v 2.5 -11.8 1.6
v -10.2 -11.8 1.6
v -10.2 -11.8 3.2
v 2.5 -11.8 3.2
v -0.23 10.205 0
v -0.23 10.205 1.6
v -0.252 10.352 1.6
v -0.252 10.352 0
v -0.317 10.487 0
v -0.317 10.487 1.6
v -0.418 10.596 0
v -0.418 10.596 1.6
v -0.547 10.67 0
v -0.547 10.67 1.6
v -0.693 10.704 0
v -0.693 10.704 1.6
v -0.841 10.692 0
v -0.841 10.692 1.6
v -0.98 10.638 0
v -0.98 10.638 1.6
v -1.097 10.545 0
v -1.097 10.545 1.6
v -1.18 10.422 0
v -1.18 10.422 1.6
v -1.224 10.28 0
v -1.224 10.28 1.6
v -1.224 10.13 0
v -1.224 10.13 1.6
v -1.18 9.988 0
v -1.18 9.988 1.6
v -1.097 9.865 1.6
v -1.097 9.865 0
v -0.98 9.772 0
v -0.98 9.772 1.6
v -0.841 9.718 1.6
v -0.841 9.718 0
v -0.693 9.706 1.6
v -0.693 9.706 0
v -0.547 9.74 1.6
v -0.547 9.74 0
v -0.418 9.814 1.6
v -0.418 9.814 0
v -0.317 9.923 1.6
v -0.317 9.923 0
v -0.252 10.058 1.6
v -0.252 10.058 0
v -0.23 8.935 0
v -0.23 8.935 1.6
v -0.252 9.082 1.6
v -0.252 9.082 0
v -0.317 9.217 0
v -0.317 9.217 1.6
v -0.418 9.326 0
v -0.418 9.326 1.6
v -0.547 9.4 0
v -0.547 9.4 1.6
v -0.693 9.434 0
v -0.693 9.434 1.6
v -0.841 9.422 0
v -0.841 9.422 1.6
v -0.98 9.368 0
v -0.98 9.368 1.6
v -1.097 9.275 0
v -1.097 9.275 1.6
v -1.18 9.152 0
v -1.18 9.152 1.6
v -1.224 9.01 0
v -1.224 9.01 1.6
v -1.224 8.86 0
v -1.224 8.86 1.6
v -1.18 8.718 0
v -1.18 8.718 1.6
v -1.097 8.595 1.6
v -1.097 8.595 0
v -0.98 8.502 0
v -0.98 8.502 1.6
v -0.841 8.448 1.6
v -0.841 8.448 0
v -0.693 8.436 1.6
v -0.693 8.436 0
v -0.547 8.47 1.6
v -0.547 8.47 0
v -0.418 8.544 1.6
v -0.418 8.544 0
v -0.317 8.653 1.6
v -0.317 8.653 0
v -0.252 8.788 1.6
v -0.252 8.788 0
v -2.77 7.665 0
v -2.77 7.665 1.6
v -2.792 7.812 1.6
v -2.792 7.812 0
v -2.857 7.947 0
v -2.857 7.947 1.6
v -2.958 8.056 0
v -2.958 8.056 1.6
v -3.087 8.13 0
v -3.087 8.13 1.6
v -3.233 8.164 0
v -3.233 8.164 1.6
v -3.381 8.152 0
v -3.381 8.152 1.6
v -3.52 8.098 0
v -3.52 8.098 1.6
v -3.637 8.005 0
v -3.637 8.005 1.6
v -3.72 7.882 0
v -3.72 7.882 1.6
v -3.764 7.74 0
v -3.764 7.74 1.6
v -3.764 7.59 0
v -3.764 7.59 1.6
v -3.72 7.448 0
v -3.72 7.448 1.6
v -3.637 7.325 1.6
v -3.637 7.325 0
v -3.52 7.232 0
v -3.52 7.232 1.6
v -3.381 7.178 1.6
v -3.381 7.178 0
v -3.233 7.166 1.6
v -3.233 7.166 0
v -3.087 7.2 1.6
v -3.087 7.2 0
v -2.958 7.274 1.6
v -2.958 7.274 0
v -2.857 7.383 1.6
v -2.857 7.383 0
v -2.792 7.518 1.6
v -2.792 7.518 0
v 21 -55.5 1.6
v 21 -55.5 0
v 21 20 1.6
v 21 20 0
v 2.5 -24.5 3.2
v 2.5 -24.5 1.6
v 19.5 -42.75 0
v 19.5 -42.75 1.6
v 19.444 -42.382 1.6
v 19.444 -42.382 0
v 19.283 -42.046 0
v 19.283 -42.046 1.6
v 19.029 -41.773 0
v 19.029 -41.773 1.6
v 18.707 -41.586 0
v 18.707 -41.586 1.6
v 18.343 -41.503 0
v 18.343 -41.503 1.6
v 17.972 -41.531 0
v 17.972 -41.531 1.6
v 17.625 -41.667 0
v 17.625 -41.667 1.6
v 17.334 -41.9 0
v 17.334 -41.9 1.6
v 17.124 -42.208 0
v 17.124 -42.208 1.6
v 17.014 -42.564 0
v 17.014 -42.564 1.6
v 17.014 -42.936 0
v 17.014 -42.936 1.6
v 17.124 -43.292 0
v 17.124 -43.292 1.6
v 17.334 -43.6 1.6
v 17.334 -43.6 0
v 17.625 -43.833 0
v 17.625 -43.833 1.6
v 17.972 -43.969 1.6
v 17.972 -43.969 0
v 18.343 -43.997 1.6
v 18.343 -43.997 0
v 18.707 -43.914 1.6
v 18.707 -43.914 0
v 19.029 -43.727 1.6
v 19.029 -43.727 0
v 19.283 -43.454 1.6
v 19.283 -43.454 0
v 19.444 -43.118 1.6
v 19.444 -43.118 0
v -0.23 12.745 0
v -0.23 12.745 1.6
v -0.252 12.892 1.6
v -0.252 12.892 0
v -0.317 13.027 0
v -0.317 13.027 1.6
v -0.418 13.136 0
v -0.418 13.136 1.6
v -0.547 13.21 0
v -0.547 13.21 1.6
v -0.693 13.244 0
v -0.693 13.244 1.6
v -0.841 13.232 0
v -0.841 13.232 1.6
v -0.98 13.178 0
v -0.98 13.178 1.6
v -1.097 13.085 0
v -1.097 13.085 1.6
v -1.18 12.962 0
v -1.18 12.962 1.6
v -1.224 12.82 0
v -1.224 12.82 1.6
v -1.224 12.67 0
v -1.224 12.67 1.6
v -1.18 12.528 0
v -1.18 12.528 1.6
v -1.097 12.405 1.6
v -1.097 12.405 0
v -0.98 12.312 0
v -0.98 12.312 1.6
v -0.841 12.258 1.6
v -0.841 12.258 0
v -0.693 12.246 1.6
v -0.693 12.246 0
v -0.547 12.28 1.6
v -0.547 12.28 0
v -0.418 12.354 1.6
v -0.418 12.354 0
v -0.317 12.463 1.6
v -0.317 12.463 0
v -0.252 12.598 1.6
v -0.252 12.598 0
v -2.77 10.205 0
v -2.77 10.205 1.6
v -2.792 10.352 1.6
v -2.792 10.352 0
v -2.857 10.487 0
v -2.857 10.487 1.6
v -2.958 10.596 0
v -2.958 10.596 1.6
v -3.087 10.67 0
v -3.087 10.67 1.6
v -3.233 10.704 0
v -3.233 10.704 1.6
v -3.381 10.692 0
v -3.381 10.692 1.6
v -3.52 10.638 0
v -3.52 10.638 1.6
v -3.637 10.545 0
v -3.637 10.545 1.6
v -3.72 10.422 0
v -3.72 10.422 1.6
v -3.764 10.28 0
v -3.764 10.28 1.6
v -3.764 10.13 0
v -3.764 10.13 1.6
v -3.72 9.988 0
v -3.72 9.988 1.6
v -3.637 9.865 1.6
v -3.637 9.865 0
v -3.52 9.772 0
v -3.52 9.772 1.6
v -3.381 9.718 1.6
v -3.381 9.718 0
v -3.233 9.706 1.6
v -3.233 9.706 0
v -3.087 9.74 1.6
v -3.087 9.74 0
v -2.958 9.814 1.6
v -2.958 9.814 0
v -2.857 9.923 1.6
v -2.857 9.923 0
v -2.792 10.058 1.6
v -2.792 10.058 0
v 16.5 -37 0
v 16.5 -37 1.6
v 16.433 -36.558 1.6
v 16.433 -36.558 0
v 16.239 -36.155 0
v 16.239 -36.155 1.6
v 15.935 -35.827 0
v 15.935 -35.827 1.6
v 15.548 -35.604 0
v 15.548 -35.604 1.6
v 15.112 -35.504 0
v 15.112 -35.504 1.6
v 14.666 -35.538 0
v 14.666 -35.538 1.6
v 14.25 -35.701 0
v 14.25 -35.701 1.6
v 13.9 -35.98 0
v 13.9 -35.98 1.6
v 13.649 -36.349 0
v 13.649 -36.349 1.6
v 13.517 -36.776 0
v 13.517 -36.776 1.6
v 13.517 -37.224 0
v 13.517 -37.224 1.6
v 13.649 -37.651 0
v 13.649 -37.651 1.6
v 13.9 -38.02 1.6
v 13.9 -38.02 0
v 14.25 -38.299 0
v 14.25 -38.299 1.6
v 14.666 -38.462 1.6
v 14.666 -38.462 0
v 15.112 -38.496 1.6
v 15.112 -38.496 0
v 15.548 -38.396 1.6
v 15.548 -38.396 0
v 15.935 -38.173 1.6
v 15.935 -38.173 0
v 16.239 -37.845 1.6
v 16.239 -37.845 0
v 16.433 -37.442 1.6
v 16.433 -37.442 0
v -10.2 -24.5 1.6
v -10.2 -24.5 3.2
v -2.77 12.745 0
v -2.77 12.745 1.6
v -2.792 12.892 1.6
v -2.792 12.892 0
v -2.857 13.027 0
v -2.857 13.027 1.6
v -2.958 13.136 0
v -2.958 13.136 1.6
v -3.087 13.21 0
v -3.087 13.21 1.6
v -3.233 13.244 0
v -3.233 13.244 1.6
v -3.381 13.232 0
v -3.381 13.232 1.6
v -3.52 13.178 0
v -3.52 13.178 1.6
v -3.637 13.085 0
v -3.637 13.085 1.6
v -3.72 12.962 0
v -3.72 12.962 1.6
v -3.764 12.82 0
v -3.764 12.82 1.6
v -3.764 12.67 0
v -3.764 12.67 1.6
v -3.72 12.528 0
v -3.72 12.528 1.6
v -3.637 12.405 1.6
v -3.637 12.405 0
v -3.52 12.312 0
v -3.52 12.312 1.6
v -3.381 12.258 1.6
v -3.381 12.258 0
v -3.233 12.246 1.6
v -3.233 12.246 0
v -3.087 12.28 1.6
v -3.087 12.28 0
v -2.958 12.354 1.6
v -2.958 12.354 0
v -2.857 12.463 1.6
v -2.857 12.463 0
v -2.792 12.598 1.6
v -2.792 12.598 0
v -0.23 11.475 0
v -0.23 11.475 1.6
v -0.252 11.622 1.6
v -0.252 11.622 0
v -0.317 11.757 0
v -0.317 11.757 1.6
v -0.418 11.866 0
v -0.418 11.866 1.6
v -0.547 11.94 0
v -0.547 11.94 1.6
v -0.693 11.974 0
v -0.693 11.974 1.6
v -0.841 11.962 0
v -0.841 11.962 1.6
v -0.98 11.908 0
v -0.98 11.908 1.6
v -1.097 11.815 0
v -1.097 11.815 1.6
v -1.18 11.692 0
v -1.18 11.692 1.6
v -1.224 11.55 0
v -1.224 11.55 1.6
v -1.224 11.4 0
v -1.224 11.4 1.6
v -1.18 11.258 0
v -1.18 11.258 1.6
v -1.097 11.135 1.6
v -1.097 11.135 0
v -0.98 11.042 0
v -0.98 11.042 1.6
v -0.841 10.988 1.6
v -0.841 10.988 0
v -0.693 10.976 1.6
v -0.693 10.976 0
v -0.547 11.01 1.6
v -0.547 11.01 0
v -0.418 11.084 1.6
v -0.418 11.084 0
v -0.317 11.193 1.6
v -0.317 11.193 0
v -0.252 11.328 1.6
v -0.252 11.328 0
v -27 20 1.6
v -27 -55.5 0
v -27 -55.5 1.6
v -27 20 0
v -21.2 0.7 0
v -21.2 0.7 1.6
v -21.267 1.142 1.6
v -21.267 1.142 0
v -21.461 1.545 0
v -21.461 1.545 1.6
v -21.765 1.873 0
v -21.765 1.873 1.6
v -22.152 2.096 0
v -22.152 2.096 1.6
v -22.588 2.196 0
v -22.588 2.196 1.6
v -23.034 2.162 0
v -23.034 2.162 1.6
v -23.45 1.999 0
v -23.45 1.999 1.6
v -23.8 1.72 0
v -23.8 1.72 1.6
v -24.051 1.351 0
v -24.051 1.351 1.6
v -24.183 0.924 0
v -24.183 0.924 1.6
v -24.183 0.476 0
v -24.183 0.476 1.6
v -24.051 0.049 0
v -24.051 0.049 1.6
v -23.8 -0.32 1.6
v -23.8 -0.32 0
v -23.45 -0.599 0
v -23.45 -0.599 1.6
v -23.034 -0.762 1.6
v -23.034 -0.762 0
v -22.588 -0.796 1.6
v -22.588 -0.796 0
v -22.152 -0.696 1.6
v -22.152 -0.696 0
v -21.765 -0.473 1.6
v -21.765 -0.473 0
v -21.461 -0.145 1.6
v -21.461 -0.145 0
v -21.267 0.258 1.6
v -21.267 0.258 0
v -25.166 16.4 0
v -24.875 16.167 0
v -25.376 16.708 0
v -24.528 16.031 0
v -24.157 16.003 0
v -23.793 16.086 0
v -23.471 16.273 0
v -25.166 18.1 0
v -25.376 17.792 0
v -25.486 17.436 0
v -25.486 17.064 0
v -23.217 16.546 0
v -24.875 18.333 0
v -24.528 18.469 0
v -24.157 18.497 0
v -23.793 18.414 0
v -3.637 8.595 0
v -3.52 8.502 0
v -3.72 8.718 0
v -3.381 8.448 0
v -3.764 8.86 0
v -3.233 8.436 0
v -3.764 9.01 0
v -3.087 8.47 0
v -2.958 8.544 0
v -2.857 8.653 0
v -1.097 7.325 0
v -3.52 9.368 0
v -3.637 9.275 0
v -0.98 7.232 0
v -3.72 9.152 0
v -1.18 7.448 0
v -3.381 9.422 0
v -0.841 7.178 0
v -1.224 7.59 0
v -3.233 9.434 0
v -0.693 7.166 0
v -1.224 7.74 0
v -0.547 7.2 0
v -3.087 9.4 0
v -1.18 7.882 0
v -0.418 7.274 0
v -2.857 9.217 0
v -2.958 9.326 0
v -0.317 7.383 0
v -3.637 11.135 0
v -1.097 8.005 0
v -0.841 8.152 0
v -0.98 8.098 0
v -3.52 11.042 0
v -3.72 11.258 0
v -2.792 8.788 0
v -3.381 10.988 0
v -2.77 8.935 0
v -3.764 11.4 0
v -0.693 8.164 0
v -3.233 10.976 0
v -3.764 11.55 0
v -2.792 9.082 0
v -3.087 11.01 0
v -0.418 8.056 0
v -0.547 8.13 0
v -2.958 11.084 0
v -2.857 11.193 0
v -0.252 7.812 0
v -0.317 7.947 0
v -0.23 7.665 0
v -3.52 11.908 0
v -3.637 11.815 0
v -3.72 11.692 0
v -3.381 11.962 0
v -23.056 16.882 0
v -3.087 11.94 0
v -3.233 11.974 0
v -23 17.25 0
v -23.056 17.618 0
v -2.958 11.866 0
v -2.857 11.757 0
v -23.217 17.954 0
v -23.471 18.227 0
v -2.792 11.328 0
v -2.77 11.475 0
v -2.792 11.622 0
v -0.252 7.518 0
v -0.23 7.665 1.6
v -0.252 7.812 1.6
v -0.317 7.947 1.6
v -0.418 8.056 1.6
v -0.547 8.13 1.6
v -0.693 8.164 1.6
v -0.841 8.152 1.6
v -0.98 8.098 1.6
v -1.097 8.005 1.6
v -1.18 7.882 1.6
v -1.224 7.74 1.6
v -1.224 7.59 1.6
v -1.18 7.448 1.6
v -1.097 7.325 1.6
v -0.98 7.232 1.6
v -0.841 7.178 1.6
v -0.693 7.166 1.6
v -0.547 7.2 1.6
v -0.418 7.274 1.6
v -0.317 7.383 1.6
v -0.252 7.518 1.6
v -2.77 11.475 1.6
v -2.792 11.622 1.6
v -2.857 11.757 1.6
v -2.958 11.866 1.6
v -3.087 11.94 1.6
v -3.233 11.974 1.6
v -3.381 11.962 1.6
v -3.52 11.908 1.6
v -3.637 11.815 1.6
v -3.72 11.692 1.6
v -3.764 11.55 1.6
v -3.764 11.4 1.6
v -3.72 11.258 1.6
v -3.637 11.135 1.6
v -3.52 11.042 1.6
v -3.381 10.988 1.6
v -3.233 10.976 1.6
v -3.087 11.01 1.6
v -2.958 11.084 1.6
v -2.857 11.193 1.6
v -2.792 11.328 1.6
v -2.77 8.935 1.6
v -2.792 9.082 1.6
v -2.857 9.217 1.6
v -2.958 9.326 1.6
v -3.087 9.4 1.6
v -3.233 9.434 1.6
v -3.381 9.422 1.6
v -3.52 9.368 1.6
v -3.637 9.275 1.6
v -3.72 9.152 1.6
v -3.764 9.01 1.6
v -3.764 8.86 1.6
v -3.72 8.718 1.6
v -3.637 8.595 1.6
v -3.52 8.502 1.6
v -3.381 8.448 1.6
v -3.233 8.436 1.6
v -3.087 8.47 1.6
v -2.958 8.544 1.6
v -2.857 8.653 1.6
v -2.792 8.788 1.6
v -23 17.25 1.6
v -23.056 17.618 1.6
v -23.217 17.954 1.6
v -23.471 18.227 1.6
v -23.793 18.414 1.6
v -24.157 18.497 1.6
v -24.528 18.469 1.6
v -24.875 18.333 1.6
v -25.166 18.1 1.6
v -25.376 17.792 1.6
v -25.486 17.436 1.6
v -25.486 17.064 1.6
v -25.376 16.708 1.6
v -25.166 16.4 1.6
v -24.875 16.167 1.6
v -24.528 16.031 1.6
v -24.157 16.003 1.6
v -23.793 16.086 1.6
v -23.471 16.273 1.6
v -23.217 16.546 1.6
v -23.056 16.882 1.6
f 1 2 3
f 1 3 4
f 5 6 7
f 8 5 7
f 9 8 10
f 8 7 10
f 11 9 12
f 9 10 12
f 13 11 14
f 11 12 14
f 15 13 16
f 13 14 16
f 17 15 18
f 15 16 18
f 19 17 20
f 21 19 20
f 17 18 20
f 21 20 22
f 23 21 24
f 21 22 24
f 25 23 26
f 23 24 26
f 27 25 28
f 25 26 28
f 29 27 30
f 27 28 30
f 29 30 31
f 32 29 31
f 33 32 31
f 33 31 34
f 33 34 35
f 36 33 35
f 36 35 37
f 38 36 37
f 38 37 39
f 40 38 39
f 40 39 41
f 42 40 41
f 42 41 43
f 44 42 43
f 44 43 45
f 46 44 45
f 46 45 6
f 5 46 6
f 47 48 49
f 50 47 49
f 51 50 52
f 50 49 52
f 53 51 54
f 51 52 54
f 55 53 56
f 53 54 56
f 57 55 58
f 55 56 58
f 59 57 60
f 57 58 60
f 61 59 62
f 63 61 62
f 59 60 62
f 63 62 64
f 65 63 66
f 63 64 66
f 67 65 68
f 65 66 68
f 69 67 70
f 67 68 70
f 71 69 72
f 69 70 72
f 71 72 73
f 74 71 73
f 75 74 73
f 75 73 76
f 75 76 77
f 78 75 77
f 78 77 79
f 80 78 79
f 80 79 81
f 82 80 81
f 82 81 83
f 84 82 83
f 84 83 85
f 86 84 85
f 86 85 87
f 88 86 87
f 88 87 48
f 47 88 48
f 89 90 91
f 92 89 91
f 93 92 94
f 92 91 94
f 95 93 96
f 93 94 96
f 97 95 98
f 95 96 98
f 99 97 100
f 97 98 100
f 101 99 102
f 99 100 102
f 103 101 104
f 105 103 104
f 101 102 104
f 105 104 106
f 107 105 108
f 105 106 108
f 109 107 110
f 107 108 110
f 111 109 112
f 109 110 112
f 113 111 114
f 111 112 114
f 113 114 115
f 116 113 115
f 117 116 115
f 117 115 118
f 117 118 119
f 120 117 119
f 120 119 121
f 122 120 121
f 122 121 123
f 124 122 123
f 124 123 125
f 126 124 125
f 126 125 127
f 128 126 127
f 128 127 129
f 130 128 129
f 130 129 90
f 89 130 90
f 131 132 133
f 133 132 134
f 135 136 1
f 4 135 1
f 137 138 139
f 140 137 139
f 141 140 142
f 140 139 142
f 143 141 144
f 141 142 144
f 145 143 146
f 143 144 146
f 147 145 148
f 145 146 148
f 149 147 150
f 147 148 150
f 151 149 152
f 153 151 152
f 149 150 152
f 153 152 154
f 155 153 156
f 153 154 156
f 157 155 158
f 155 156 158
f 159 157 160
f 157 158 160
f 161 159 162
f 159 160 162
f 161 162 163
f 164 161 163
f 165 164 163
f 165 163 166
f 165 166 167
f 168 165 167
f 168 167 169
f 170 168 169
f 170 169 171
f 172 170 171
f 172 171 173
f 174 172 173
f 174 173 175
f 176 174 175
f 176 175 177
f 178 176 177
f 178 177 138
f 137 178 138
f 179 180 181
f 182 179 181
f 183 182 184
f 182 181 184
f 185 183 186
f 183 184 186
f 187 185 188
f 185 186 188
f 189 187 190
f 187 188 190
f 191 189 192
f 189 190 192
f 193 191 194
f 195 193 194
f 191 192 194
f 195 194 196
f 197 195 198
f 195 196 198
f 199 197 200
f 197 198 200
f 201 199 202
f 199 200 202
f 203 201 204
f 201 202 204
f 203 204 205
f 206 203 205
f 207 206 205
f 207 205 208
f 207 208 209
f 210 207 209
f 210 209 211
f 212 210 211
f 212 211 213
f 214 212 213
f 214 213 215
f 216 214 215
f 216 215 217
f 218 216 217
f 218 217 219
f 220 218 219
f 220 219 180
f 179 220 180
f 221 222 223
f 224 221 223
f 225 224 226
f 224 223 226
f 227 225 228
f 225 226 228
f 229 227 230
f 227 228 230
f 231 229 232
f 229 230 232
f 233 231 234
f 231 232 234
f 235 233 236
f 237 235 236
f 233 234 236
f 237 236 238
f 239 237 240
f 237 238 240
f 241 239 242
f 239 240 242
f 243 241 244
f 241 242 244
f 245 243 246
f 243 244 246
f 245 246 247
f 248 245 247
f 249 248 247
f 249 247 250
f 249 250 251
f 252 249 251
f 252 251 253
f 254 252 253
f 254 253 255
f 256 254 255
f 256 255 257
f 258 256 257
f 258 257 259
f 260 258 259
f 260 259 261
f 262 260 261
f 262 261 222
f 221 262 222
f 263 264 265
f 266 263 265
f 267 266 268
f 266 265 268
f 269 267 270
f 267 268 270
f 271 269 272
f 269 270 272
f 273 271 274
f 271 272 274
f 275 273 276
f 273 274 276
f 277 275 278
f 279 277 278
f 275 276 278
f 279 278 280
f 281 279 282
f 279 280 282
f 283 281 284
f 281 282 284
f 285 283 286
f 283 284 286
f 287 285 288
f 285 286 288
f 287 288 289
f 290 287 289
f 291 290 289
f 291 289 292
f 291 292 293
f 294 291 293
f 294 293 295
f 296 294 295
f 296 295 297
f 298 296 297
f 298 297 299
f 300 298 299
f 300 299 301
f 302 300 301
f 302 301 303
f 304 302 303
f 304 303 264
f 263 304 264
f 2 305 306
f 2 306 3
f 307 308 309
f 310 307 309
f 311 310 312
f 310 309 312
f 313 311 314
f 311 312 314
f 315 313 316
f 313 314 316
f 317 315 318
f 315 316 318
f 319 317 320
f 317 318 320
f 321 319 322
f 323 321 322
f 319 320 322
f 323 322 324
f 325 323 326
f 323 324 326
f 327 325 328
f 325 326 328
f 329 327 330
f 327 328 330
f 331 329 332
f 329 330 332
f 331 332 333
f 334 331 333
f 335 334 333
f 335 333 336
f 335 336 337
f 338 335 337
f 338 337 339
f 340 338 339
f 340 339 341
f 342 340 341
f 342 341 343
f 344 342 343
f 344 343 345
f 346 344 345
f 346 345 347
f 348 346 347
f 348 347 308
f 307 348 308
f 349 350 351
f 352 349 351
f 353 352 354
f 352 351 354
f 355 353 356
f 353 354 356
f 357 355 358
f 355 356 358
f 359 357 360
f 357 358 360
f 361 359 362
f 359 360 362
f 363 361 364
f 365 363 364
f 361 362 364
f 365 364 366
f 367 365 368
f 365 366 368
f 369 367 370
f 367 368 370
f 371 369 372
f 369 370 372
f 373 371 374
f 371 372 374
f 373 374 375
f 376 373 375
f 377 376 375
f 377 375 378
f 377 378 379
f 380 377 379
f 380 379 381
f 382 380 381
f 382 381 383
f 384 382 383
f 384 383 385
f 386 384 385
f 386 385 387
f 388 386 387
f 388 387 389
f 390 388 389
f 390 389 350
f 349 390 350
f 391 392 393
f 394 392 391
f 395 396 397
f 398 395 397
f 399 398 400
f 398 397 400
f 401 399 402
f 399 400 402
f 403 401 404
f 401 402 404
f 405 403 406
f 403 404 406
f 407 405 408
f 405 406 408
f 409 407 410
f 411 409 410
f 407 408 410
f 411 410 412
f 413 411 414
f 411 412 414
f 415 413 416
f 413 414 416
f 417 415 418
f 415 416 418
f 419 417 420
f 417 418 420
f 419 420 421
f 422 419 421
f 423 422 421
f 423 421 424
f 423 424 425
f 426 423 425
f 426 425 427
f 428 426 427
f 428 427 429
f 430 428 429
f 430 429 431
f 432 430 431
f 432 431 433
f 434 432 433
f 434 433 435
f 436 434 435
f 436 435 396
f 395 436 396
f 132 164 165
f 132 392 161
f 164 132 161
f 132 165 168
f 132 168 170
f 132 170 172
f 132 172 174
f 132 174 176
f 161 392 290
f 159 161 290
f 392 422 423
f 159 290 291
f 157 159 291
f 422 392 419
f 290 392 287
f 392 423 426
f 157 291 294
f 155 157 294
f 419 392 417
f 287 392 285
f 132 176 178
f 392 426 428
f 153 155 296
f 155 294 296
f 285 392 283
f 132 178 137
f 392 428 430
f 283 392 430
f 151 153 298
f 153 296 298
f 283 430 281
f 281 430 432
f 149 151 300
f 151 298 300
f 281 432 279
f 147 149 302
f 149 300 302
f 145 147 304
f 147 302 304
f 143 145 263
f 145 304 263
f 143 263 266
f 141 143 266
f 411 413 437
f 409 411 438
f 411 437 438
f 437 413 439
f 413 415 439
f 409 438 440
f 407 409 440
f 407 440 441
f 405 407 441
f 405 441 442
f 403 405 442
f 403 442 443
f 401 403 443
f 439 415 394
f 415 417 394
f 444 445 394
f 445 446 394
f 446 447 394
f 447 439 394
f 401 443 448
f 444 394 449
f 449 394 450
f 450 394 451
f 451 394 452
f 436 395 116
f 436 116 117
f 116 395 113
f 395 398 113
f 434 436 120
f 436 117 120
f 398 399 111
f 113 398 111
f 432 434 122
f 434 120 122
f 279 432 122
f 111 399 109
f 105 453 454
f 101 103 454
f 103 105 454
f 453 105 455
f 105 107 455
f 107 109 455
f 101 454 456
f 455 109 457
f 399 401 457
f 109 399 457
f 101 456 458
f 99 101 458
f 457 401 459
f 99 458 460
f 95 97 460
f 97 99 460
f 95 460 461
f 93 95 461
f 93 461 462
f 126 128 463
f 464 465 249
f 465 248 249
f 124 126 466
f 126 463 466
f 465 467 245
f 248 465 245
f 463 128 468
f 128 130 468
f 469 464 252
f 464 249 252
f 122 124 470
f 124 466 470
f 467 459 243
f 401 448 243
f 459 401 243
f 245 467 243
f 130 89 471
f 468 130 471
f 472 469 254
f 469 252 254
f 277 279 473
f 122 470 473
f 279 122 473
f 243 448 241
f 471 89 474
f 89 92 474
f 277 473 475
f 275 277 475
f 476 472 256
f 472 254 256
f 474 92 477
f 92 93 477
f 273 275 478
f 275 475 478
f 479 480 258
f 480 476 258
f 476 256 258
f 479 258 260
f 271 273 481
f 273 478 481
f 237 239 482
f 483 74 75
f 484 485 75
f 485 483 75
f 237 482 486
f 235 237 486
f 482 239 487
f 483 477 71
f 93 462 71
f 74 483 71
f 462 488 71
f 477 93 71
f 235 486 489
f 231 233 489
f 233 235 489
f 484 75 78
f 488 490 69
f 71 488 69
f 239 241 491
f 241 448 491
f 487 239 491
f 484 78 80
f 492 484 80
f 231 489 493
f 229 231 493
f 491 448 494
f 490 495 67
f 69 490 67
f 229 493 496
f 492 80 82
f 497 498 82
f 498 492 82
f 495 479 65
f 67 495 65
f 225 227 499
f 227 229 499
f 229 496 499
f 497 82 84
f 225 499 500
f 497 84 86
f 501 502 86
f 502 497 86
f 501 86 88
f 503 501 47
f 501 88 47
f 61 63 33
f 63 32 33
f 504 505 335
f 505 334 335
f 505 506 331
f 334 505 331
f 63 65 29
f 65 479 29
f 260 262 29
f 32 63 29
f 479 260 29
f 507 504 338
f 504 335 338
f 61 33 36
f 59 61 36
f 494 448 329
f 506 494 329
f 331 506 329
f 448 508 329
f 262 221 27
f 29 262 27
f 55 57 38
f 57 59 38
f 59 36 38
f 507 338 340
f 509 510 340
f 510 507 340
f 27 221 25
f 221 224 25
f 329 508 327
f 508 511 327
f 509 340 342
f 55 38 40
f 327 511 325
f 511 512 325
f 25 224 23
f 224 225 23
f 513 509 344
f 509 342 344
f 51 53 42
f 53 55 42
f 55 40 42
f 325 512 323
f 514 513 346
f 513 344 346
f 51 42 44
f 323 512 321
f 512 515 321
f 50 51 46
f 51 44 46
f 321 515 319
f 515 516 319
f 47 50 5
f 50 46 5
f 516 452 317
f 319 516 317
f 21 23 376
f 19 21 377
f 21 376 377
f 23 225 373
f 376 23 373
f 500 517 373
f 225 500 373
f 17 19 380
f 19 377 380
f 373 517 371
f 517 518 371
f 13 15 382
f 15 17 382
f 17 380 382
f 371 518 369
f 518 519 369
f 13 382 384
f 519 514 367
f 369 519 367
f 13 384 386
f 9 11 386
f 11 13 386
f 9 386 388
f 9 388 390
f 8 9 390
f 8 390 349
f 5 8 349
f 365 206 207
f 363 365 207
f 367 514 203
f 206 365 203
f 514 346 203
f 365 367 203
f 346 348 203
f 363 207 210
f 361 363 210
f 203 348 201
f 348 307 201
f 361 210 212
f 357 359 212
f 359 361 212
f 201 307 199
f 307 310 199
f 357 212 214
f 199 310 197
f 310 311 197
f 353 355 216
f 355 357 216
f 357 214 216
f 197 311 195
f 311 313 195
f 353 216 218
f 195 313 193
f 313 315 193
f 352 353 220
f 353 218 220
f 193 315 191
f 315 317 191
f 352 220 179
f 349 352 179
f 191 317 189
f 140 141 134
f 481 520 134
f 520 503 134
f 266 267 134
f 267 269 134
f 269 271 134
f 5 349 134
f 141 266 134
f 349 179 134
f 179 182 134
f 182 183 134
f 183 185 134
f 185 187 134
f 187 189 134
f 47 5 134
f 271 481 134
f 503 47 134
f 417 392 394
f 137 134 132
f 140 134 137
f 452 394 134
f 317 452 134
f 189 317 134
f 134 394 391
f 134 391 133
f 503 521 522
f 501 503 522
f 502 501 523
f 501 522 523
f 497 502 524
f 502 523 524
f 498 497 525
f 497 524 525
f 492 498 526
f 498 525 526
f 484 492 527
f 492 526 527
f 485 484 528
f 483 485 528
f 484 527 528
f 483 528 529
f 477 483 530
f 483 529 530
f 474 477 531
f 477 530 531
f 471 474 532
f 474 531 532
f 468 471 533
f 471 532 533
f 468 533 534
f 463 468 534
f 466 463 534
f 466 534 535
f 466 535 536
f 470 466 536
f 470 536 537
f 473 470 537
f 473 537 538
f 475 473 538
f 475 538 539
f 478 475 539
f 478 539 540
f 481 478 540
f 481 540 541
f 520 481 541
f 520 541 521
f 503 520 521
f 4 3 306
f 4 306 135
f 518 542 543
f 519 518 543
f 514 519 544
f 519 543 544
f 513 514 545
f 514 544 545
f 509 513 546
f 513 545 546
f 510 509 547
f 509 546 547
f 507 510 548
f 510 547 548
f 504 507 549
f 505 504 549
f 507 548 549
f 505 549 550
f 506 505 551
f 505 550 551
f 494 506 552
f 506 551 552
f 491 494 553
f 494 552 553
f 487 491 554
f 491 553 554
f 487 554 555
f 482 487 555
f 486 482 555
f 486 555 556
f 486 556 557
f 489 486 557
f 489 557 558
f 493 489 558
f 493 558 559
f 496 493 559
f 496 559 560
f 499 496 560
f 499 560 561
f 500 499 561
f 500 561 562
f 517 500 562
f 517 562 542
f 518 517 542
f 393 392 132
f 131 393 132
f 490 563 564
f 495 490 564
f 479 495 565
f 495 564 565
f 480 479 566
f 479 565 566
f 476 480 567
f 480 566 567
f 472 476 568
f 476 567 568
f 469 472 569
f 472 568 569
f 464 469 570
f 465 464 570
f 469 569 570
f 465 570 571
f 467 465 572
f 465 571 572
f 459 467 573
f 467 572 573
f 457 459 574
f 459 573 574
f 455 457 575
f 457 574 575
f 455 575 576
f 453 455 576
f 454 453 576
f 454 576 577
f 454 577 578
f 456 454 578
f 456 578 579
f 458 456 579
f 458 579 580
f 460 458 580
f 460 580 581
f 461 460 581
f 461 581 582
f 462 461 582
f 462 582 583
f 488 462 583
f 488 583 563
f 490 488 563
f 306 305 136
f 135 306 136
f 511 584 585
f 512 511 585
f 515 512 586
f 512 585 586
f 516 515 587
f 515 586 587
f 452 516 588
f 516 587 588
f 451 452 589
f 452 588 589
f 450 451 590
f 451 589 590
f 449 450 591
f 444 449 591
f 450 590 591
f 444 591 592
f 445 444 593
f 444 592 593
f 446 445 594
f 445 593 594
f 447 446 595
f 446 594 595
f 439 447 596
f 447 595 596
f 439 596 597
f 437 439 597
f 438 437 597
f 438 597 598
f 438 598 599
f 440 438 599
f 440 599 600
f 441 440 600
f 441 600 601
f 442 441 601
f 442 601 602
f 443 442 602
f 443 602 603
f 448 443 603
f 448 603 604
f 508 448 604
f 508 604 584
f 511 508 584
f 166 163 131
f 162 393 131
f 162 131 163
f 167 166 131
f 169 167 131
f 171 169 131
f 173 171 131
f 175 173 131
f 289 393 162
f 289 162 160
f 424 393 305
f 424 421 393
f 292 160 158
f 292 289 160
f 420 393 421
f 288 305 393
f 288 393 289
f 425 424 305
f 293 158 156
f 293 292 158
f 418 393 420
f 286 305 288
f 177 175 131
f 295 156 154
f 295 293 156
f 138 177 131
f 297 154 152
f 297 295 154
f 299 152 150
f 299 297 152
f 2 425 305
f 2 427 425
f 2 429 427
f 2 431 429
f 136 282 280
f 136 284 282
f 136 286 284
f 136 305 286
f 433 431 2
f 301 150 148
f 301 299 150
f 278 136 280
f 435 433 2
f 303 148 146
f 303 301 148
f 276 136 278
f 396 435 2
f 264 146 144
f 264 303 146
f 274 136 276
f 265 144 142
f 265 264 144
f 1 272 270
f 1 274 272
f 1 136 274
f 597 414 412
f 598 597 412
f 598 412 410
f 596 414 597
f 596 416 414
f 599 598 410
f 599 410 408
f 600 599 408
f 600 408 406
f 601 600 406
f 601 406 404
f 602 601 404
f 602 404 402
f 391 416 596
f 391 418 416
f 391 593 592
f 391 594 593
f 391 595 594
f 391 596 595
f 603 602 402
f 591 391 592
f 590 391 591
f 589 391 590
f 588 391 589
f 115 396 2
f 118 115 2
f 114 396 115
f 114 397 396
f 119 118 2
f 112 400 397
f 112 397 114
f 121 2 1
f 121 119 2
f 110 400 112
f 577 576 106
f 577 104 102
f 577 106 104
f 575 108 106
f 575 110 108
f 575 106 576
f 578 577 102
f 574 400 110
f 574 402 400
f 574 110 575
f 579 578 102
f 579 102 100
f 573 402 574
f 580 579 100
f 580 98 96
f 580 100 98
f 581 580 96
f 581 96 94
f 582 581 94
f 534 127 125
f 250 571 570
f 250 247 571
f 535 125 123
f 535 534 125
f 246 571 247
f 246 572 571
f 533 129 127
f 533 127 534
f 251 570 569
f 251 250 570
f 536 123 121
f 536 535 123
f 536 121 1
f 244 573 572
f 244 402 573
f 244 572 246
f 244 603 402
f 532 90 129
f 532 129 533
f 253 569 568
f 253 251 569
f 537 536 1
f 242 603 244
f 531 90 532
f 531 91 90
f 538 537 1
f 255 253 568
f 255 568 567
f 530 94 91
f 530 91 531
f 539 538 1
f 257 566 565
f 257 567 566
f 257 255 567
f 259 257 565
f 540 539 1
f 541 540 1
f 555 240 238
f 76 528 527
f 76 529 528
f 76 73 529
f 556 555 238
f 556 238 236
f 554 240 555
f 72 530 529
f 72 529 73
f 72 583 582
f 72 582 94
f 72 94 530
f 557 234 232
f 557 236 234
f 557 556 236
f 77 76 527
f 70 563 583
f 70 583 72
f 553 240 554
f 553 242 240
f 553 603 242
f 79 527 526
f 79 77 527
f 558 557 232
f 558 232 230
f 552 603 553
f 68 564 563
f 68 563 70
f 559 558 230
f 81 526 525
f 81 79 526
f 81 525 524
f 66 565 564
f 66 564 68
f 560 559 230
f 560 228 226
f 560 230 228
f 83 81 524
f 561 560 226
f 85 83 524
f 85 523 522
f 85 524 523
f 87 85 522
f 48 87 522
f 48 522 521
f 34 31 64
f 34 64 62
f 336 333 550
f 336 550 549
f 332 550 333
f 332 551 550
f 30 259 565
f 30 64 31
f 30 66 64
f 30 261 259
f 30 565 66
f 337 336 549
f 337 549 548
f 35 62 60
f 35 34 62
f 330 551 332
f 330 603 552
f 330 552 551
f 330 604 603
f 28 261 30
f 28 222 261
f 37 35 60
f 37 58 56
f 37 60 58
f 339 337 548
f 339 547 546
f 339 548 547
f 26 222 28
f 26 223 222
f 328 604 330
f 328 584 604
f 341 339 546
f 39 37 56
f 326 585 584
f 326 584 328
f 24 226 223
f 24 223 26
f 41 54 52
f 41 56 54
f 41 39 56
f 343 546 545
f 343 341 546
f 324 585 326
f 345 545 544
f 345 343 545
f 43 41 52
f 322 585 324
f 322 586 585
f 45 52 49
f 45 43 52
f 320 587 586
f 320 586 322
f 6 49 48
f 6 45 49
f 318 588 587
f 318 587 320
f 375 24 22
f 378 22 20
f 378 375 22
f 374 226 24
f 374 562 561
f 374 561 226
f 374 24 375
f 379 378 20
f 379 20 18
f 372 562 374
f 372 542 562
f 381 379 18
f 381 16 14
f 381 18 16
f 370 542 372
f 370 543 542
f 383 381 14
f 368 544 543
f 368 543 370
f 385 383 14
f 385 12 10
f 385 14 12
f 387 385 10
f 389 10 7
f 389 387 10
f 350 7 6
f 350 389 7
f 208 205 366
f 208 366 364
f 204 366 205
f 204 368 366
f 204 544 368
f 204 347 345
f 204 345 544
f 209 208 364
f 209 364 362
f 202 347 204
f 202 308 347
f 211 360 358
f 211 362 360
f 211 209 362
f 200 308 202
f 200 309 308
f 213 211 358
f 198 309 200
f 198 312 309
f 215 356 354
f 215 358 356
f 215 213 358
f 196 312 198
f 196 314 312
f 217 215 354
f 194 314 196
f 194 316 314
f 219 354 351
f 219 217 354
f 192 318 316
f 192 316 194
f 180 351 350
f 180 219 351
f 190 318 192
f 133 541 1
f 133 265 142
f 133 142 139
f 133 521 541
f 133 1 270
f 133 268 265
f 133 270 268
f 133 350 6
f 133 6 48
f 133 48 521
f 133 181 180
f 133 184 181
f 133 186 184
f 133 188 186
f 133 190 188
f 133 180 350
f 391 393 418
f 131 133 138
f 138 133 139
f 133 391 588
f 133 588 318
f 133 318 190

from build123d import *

# Parameters (mm, degrees)
SKETCH008_W                        = 48
SKETCH008_H                        = 75.5
PAD003_DEPTH                       = 1.6
SKETCH009_W                        = 12.7
SKETCH009_H                        = 12.7
PAD005_DEPTH                       = 1.6
SKETCH010_R                        = 1.25
SKETCH010_R_2                      = 1.5
POCKET005_DEPTH                    = 1.601
SKETCH020_R                        = 0.5
POCKET010_DEPTH                    = 180.6483680343
SKETCH020_LINEARPATTERN002_2_R     = 0.5
POCKET010_LINEARPATTERN002_2_DEPTH = 180.6483680343
LINEARPATTERN003_COUNT             = 5
LINEARPATTERN003_PITCH             = 1.27


with BuildPart() as part:
    # Sketch008 → Pad003 (new body)
    with BuildSketch(Plane.XY):
        with Locations((-3, -17.75)):
            Rectangle(SKETCH008_W, SKETCH008_H)
    extrude(amount=PAD003_DEPTH)

    # Sketch009 (on Face6 of Pad003) → Pad005 (join)
    with BuildSketch(Plane.XY.offset(1.6)):
        with Locations((-3.85, -18.15)):
            Rectangle(SKETCH009_W, SKETCH009_H)
    extrude(amount=PAD005_DEPTH)

    # Sketch010 → Pocket005 (cut, through all)
    with BuildSketch(Plane.XY.offset(1.6)):
        with Locations((-24.25, 17.25)):
            Circle(SKETCH010_R)
        with Locations((18.25, -42.75)):
            Circle(SKETCH010_R)
        with Locations((-22.7, 0.7)):
            Circle(SKETCH010_R_2)
        with Locations((15, -37)):
            Circle(SKETCH010_R_2)
    extrude(amount=-POCKET005_DEPTH, mode=Mode.SUBTRACT)

    # Sketch020 (on Face5 of Pocket005) → Pocket010 (cut, through all)
    with BuildSketch(Plane.XY.offset(1.6)):
        with Locations((-3.27, 12.745)):
            Circle(SKETCH020_R)
    pocket010 = extrude(amount=-POCKET010_DEPTH, mode=Mode.SUBTRACT)

    # Sketch020 LinearPattern002 2 → Pocket010 LinearPattern002 2 (cut, through all)
    with BuildSketch(Plane(origin=(2.54, 0, 1.6), x_dir=(1, 0, 0), z_dir=(0, 0, 1))):
        with Locations((-3.27, 12.745)):
            Circle(SKETCH020_LINEARPATTERN002_2_R)
    pocket010_linearpattern002_2 = extrude(amount=-POCKET010_LINEARPATTERN002_2_DEPTH, mode=Mode.SUBTRACT)

    # LinearPattern003: Pocket010, Pocket010 LinearPattern002 2 ×5
    with Locations(*[(0, -i * LINEARPATTERN003_PITCH, 0) for i in range(1, LINEARPATTERN003_COUNT)]):
        add(pocket010, mode=Mode.SUBTRACT)
        add(pocket010_linearpattern002_2, mode=Mode.SUBTRACT)


solid = part.part
